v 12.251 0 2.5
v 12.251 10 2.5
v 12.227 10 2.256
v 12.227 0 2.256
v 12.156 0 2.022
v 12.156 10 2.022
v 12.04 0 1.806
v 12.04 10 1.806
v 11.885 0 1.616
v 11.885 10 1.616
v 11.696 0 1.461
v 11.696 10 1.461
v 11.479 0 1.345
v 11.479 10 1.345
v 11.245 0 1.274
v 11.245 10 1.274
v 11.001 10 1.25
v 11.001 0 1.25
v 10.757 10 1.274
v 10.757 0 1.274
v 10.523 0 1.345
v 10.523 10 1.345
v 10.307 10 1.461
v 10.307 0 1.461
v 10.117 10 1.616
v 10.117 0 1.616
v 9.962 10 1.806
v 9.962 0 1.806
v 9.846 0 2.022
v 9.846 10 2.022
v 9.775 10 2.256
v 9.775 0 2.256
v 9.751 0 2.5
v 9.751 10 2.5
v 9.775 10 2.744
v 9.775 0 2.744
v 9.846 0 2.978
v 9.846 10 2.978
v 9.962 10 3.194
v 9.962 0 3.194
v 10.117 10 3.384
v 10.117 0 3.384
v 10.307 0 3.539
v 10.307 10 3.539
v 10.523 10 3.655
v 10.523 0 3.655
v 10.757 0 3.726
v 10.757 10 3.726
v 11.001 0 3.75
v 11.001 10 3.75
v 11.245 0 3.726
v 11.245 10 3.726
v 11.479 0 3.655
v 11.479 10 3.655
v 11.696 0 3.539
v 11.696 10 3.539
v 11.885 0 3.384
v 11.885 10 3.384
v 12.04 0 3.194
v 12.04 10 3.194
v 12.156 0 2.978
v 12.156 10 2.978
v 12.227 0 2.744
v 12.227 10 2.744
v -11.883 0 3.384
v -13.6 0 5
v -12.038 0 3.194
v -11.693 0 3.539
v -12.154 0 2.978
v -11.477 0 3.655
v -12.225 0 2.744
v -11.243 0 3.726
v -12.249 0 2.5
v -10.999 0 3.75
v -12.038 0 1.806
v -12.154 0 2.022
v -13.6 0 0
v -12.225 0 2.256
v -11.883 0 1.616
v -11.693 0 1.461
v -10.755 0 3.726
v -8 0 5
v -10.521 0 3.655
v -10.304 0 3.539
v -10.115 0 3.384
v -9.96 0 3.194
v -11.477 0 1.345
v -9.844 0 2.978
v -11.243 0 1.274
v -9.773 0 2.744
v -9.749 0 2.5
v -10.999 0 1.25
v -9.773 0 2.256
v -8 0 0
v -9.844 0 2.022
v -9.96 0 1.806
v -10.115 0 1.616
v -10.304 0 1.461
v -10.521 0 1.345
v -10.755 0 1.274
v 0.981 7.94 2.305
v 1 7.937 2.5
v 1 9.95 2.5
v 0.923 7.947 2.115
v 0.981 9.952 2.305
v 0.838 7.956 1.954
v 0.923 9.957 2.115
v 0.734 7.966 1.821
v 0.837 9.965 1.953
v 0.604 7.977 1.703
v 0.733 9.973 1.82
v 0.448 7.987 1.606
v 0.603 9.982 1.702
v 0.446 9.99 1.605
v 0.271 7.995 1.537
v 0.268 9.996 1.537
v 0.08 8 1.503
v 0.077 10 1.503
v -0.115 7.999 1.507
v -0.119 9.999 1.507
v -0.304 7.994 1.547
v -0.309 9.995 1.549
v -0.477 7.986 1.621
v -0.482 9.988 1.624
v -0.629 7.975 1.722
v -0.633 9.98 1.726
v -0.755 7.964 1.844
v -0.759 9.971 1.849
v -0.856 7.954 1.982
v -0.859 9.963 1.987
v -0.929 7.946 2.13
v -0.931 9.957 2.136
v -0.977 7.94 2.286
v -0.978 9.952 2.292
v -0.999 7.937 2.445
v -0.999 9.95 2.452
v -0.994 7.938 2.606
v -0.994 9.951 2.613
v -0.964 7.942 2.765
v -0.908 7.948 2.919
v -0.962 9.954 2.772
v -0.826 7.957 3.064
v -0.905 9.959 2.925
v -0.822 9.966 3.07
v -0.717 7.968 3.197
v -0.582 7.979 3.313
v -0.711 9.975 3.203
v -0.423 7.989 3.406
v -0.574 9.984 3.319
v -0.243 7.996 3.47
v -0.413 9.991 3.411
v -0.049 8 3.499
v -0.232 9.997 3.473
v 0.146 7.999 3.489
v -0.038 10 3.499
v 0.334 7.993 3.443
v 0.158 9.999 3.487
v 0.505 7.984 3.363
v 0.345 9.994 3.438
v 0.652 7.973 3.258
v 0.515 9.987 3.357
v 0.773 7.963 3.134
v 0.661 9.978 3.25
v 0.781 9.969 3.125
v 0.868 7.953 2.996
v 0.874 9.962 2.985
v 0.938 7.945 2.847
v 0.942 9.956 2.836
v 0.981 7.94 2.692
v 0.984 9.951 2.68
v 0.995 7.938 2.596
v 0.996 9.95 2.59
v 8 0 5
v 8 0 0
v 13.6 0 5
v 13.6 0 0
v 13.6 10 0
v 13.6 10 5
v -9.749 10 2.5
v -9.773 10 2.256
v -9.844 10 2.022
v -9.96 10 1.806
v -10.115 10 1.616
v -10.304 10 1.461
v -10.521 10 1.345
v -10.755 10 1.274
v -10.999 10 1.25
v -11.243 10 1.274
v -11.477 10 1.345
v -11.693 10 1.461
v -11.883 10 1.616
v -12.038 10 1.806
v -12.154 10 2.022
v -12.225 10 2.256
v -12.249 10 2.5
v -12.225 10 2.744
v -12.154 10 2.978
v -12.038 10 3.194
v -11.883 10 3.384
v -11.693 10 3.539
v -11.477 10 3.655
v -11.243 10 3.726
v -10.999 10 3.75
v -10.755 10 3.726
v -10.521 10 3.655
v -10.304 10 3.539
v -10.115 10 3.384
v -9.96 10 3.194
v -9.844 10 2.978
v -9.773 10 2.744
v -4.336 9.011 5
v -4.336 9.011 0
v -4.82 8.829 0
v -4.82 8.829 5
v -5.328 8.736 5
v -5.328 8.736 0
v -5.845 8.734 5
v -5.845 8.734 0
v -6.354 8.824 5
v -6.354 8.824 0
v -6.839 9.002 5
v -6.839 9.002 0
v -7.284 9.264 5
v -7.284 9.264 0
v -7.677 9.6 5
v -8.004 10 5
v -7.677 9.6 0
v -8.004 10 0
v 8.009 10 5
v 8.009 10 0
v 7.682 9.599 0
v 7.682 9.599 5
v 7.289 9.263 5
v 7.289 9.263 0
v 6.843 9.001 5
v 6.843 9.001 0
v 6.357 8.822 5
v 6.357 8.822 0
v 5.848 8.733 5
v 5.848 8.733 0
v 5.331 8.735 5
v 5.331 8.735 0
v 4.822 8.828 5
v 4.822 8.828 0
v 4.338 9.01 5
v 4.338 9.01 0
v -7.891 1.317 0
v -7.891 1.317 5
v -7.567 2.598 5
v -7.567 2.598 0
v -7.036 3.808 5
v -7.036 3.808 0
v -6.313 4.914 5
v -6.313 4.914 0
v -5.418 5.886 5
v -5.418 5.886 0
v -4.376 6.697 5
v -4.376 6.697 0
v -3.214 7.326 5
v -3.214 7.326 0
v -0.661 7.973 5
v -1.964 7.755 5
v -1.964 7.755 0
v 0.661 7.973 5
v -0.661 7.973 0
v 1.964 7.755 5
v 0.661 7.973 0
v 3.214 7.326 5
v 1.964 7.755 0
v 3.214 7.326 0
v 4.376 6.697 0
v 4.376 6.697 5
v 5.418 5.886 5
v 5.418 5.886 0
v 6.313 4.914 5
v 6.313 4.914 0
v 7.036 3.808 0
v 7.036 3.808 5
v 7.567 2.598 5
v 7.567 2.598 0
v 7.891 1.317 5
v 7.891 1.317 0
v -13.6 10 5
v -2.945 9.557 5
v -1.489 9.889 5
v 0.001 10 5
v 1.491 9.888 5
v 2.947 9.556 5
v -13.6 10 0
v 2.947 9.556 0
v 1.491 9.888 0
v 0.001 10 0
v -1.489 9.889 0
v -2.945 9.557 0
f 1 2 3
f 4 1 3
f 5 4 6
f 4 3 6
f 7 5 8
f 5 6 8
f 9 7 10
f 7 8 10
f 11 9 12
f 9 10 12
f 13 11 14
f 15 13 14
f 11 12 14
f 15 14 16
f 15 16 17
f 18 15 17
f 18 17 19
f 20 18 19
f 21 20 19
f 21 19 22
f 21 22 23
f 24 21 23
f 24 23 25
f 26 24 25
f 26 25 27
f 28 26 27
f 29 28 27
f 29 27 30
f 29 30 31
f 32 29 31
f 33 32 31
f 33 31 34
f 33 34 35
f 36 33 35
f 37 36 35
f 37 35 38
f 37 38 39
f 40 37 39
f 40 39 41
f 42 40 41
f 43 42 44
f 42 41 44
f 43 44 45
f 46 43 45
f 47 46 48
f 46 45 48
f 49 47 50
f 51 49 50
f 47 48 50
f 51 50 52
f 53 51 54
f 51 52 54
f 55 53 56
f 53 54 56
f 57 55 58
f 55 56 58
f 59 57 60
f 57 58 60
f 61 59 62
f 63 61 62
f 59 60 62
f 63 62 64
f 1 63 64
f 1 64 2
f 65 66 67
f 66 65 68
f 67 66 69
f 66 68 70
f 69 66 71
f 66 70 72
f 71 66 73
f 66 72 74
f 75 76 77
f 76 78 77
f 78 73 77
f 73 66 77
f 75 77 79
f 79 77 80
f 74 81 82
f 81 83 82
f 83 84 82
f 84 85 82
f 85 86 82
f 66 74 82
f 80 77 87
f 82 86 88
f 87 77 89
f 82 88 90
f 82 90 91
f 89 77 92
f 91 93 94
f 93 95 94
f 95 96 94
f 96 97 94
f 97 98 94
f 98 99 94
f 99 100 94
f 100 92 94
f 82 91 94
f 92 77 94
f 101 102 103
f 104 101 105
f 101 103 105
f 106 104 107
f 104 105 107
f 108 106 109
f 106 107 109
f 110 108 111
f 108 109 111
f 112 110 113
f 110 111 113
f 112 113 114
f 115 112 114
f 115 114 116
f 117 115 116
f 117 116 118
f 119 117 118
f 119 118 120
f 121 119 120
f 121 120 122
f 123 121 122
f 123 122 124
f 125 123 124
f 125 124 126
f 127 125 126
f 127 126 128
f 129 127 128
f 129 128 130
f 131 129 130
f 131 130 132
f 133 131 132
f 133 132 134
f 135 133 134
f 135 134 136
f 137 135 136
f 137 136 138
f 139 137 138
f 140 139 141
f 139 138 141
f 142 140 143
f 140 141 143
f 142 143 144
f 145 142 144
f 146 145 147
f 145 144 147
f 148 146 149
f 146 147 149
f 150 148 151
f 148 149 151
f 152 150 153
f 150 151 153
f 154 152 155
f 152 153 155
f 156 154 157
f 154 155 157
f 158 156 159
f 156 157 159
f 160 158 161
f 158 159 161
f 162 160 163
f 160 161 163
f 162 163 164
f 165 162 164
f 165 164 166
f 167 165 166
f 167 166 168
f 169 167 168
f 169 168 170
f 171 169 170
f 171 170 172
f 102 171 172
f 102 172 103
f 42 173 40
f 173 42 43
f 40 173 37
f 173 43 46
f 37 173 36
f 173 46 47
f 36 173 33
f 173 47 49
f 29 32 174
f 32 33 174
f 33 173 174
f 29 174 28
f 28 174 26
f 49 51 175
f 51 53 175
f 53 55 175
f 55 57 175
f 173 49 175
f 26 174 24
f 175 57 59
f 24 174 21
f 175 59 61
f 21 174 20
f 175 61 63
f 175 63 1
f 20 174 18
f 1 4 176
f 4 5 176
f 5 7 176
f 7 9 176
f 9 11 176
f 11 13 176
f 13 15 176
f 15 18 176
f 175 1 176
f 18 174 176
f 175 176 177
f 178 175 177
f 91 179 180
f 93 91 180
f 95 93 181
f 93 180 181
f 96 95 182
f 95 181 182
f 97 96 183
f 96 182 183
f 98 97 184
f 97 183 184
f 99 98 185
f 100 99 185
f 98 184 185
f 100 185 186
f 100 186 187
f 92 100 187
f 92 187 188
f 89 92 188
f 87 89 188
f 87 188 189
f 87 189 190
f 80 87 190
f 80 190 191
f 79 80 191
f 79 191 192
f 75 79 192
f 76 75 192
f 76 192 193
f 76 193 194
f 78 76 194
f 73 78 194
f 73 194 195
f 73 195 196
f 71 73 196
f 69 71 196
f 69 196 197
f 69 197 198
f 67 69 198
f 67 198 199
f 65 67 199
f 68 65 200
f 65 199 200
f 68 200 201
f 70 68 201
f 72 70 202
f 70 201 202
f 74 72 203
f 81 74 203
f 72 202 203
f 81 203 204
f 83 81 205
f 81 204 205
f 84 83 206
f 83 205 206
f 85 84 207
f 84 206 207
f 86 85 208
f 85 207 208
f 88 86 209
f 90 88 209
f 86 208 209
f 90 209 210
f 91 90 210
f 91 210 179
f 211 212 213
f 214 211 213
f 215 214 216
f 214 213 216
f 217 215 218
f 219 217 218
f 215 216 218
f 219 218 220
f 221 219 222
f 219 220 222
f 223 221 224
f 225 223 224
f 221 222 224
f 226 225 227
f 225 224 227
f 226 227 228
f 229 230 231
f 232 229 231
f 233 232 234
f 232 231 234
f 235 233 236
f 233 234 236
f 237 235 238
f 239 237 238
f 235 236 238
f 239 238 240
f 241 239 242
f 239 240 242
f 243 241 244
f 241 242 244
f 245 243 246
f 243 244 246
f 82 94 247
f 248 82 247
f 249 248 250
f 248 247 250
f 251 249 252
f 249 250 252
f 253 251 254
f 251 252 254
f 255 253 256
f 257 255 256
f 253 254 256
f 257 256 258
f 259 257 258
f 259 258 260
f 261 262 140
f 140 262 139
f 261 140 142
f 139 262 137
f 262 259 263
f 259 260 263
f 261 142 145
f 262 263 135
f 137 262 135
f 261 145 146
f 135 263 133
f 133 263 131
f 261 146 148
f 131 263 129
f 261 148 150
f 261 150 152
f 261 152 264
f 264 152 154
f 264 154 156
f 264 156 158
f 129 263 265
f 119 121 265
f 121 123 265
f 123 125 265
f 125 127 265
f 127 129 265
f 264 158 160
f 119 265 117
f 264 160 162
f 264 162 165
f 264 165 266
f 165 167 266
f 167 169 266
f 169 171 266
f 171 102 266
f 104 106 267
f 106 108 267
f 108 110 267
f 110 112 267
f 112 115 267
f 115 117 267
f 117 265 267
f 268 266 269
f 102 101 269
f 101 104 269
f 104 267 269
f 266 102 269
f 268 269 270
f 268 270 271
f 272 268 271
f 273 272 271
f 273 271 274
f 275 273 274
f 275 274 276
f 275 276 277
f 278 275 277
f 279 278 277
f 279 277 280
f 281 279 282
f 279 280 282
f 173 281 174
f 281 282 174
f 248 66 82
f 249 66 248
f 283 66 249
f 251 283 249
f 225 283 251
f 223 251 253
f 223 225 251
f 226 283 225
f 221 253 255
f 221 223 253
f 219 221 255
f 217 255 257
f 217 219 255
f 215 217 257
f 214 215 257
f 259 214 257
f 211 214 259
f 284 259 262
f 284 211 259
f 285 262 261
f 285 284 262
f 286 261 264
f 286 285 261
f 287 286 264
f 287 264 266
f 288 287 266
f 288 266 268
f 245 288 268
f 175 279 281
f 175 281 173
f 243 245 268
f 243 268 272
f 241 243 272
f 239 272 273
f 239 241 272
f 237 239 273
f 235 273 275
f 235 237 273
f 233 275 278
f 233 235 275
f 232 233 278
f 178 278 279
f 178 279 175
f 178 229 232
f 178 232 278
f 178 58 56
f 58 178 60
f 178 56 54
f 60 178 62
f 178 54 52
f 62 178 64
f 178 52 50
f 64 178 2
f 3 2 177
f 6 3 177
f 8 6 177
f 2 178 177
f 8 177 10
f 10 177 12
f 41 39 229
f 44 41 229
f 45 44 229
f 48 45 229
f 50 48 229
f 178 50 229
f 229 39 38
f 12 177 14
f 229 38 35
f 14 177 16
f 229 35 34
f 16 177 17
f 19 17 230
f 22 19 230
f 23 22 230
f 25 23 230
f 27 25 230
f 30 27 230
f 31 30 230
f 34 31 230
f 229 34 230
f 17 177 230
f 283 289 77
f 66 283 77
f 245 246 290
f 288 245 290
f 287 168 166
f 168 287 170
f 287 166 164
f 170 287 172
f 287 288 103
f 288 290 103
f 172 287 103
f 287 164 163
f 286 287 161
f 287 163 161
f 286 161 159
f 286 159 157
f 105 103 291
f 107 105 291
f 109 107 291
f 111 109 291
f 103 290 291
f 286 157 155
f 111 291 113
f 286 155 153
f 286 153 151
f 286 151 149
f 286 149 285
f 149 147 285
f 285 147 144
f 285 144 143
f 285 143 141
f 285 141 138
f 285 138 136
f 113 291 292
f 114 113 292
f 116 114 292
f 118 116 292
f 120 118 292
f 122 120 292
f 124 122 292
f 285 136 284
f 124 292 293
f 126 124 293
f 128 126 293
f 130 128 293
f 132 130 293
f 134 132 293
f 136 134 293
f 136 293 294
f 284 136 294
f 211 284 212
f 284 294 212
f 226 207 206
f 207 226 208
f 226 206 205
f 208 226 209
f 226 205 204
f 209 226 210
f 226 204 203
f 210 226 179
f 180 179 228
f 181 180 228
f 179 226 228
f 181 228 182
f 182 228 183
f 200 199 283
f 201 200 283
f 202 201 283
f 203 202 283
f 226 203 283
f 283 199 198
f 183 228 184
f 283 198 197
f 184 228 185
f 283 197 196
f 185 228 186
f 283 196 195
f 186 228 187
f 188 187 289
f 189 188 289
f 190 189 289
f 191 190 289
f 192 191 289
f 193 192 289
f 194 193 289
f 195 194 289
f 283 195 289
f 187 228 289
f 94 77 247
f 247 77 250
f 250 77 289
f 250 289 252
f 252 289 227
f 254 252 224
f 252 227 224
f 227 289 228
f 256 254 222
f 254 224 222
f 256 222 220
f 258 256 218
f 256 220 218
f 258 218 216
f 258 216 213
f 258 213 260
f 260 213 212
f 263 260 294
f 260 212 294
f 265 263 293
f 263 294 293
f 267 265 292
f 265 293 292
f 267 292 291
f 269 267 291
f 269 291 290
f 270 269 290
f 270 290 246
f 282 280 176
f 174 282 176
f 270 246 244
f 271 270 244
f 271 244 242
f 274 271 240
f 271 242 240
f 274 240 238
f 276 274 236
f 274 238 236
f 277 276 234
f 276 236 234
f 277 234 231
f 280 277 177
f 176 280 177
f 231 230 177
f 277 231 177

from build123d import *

# Parameters (mm, degrees)
BOSS_EXTRUDE1_DEPTH     = 5
SKETCH3_R               = 1.25
CUT_EXTRUDE1_DEPTH      = 300
CUT_EXTRUDE1_DEPTH_BACK = 11
SKETCH4_R               = 1
CUT_EXTRUDE2_DEPTH      = 11


with BuildPart() as part:
    # Sketch2 → Boss-Extrude1 (new body)
    with BuildSketch(Plane.XY):
        with BuildLine():
            ThreePointArc((-8, 0), (0, 8), (8, 0))
            Line((8, 0), (13.6, 0))
            Line((13.6, 0), (13.6, 10))
            Line((13.6, 10), (8.008871246, 10))
            ThreePointArc((8.008871246, 10), (6.357463889, 8.822466805), (4.337930538, 9.01012534))
            ThreePointArc((4.337930538, 9.01012534), (0.001186479, 9.99999993), (-4.335792351, 9.011154459))
            ThreePointArc((-4.335792351, 9.011154459), (-6.353531515, 8.82385013), (-8.003690819, 10))
            Line((-8.003690819, 10), (-13.6, 10))
            Line((-13.6, 10), (-13.6, 0))
            Line((-13.6, 0), (-8, 0))
        make_face()
    extrude(amount=BOSS_EXTRUDE1_DEPTH)

    # Sketch3 → Cut-Extrude1 (cut, two sides)
    with BuildSketch(Plane(origin=(0, 10, 0), x_dir=(1, 0, 0), z_dir=(0, 1, 0))) as cut_extrude1_sk:
        with Locations((-10.998930891, -2.5)):
            Circle(SKETCH3_R)
        with Locations((11.001069109, -2.5)):
            Circle(SKETCH3_R)
    extrude(amount=CUT_EXTRUDE1_DEPTH, mode=Mode.SUBTRACT)
    extrude(cut_extrude1_sk.sketch, amount=-CUT_EXTRUDE1_DEPTH_BACK, mode=Mode.SUBTRACT)

    # Sketch4 → Cut-Extrude2 (cut, through all)
    with BuildSketch(Plane(origin=(0, 10, 0), x_dir=(1, 0, 0), z_dir=(0, 1, 0))):
        with Locations((0, -2.5)):
            Circle(SKETCH4_R)
    extrude(amount=-CUT_EXTRUDE2_DEPTH, mode=Mode.SUBTRACT)


solid = part.part
